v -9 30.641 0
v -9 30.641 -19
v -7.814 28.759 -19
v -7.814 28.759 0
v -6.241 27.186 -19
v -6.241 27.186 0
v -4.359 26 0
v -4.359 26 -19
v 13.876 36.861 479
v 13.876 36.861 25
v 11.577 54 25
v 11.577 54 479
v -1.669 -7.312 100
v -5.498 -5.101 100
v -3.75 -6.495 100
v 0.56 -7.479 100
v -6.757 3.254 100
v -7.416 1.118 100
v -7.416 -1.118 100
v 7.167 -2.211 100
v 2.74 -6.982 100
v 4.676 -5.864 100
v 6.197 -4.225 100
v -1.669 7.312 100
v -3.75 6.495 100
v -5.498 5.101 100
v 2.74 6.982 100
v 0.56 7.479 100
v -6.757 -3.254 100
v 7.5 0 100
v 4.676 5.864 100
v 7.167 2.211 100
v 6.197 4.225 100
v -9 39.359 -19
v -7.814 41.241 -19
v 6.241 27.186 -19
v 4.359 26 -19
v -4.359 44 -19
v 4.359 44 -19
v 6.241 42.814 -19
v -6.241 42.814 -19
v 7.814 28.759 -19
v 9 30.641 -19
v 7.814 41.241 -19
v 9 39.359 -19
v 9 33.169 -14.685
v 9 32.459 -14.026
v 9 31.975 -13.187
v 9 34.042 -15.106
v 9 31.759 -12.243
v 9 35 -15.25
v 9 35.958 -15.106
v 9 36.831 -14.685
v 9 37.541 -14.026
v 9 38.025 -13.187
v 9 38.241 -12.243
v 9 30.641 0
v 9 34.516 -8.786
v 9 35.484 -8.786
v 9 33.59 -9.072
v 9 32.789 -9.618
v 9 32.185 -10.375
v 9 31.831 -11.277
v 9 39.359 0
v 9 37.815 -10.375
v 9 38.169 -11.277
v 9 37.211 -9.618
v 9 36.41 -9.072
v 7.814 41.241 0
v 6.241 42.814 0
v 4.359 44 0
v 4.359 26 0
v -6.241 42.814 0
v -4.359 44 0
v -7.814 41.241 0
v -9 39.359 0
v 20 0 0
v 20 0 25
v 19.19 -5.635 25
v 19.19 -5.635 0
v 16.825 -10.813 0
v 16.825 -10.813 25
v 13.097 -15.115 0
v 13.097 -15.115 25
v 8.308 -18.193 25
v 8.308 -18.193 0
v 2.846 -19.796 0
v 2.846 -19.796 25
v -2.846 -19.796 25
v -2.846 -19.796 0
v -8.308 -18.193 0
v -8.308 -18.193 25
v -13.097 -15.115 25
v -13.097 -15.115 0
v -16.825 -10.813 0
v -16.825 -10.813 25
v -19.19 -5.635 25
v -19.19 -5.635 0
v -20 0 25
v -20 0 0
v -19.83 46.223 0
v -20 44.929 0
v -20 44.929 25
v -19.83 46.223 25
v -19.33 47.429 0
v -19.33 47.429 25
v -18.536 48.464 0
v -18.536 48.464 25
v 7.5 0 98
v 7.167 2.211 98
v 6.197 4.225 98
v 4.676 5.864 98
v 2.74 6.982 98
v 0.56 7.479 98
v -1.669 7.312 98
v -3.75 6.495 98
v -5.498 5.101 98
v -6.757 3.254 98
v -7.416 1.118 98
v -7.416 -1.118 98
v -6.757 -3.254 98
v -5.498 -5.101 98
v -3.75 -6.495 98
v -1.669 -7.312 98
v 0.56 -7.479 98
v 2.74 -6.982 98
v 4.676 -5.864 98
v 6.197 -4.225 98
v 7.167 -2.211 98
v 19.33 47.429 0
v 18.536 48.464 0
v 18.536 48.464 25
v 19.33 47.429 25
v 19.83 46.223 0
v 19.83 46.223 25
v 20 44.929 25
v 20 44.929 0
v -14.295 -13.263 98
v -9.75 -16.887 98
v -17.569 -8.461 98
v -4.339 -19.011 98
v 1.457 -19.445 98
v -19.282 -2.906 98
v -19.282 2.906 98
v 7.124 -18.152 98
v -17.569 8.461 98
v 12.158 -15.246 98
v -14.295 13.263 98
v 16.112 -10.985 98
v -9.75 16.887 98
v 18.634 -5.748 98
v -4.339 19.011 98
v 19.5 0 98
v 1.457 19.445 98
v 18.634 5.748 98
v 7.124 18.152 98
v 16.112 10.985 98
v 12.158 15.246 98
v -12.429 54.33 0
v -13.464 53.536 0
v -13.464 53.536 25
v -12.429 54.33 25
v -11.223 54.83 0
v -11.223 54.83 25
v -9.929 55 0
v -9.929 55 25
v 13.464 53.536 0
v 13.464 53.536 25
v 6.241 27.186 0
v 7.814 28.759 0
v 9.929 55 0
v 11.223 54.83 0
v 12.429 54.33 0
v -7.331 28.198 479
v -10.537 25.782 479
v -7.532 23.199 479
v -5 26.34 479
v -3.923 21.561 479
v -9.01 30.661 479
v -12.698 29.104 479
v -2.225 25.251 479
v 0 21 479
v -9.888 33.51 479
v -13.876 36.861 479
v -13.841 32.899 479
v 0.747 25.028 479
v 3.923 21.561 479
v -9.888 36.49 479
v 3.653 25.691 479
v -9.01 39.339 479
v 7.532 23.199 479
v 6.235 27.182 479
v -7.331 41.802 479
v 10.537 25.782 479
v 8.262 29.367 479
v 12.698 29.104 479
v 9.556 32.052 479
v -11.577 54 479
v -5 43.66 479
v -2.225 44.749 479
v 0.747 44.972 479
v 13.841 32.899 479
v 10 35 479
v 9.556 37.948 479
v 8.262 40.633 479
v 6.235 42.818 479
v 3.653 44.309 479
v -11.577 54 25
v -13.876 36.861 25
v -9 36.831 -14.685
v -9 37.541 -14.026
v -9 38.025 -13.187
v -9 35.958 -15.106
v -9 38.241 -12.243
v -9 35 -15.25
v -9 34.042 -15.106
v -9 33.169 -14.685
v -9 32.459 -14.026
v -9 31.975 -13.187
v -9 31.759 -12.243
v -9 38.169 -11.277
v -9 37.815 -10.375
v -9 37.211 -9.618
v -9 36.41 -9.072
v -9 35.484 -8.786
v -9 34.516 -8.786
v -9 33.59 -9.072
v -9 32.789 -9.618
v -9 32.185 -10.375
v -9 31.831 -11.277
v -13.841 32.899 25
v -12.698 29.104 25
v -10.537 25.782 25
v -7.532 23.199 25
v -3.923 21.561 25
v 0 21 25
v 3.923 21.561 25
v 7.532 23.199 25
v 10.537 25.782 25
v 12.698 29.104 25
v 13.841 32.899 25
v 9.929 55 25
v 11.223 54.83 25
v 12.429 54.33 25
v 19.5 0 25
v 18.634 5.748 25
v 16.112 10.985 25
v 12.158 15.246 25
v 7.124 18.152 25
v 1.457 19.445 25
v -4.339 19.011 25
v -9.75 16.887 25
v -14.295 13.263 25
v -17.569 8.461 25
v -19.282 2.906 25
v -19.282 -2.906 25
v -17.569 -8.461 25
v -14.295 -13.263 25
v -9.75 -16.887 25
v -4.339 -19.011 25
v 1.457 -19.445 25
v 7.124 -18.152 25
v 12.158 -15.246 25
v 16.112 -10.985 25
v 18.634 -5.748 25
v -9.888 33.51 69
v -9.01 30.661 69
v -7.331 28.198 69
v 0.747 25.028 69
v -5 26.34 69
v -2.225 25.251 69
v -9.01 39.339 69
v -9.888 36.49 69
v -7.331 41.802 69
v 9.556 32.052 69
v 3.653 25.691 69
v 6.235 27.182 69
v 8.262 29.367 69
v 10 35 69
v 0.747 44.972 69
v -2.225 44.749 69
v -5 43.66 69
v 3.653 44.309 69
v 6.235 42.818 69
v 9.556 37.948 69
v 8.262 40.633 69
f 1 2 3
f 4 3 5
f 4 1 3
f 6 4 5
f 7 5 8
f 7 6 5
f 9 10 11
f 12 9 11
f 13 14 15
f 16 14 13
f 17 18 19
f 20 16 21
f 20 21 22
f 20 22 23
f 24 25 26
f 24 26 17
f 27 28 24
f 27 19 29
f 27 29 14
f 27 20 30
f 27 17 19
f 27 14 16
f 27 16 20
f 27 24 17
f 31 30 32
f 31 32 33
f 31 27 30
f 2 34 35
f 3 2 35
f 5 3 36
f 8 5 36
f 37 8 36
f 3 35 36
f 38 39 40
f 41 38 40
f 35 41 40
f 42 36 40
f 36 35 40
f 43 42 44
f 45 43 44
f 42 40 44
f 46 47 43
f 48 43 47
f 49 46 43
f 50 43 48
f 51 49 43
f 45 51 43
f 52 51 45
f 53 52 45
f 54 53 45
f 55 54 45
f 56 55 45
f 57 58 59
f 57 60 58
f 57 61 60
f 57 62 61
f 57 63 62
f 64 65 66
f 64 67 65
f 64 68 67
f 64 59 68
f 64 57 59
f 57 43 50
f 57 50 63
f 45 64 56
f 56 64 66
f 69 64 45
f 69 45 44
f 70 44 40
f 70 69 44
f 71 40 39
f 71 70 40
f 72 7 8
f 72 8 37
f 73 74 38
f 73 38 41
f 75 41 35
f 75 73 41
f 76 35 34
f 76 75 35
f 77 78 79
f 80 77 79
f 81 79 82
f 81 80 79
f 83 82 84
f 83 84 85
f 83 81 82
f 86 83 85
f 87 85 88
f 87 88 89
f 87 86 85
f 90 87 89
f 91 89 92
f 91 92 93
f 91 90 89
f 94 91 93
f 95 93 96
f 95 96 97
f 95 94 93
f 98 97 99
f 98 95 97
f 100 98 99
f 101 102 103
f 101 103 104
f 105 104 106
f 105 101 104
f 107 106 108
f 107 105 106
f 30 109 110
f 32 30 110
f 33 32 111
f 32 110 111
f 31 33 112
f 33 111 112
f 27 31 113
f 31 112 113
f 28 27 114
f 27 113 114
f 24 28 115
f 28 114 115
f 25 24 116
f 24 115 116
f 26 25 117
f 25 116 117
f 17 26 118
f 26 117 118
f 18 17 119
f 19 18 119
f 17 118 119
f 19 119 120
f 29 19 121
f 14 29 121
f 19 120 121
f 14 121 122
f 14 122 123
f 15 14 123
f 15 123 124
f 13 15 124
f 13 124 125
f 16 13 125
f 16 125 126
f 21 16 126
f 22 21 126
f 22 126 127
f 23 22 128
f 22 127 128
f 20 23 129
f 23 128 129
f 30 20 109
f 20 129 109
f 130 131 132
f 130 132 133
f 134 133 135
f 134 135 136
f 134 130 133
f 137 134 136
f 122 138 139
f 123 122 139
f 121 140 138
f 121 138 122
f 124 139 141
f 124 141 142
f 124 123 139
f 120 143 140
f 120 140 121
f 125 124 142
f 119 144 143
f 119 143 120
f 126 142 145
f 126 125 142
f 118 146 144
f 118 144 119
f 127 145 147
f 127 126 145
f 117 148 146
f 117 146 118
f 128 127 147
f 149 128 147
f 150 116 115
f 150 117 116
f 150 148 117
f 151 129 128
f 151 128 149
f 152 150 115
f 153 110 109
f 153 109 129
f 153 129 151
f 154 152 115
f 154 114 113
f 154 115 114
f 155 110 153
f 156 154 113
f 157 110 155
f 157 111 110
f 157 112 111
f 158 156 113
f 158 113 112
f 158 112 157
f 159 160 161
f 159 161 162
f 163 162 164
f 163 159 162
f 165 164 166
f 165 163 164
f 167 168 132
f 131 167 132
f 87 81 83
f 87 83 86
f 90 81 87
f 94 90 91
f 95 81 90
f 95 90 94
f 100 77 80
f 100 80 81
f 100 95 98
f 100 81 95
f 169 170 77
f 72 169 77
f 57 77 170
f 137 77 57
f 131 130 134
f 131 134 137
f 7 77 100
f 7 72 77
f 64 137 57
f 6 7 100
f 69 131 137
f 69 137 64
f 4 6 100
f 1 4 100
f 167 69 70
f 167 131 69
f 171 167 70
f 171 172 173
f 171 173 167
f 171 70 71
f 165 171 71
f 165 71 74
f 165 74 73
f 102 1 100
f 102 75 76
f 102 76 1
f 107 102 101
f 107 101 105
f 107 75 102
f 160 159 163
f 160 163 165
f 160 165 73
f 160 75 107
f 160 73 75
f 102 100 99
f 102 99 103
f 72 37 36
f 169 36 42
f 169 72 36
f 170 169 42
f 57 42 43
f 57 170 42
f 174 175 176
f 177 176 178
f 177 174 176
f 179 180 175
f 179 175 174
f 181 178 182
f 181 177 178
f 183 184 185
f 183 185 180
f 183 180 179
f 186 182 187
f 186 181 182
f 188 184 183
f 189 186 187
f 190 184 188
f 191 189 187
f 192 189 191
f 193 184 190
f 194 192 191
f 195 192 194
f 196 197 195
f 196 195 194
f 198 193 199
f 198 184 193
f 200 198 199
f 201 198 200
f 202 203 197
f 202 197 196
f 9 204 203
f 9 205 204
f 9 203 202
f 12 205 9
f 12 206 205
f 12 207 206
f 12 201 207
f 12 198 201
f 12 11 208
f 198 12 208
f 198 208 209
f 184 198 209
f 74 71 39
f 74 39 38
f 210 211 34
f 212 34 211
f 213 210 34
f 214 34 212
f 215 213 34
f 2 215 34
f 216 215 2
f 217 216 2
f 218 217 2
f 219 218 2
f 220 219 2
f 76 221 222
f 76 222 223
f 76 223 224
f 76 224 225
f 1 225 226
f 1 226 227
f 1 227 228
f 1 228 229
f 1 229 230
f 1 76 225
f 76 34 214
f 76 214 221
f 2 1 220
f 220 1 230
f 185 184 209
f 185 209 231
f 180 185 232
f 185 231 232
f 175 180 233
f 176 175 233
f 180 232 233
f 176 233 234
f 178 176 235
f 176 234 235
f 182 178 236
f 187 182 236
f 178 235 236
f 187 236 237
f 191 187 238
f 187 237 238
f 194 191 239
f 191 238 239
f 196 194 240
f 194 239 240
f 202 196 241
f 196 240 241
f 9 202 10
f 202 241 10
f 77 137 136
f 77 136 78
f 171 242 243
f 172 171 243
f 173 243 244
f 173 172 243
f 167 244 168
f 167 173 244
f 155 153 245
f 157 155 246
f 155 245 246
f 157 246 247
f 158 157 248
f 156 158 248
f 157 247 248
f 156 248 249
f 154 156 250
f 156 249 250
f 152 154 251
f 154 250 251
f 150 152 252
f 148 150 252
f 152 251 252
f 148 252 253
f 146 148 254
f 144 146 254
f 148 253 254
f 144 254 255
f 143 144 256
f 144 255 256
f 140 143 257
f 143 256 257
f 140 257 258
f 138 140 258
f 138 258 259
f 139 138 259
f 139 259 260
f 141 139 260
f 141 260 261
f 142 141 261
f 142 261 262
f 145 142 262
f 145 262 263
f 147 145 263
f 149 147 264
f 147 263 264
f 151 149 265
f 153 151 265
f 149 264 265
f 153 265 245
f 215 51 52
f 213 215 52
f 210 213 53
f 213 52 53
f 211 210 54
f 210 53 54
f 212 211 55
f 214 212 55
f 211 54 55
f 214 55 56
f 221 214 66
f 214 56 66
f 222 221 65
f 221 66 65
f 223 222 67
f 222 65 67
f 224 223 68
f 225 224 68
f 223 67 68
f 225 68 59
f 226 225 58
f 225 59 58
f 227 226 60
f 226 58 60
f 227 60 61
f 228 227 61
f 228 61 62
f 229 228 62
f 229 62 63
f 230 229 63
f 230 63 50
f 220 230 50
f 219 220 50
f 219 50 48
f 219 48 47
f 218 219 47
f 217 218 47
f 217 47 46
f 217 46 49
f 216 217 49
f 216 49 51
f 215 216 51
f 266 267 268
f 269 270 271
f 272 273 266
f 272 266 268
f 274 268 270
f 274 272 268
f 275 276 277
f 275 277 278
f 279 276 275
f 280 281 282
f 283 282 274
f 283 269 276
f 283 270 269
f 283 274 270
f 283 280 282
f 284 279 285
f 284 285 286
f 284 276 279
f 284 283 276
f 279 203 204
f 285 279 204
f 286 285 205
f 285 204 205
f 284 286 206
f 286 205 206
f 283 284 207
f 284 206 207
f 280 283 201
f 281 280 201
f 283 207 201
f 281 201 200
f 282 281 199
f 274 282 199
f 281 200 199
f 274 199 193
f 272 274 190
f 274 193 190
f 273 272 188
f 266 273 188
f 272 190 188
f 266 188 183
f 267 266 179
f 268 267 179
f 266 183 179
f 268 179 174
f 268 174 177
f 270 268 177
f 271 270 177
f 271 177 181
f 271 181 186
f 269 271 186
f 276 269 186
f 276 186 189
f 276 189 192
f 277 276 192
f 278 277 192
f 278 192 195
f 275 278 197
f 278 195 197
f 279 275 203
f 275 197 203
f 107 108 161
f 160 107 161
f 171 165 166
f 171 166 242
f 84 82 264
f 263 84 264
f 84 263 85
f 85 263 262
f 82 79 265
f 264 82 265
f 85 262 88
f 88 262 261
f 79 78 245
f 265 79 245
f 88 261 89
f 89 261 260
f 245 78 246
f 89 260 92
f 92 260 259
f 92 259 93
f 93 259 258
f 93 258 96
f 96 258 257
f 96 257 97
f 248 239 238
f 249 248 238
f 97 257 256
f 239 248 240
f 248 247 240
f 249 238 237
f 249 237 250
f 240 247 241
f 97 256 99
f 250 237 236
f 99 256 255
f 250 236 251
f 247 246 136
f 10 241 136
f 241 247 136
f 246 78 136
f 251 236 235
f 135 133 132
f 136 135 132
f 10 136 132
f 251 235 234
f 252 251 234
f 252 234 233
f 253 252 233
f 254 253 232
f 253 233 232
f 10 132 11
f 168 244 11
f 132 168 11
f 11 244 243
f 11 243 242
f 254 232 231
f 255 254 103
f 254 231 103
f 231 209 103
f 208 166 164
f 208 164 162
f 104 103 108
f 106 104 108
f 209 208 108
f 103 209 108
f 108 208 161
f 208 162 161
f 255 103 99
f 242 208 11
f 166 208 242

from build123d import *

# Parameters (mm, degrees)
EXTRUDE_1_DEPTH     = 25
SKETCH_2_R          = 19.5
EXTRUDE_2_DEPTH     = 73
SKETCH_3_R          = 7.5
EXTRUDE_3_DEPTH     = 2
EXTRUDE_4_DEPTH     = 454
SKETCH_5_R          = 10
CUT_EXTRUDE_1_DEPTH = 410
EXTRUDE_5_DEPTH     = 19
SKETCH_7_R          = 3.25
CUT_EXTRUDE_2_DEPTH = 19


with BuildPart() as part:
    # 草图1 → 凸台-拉伸1 (new body)
    with BuildSketch(Plane.XY):
        with BuildLine():
            Line((-20, 0), (-20, 44.928932188))
            ThreePointArc((-20, 44.928932188), (-19.619397663, 46.84234935), (-18.535533906, 48.464466094))
            Line((-18.535533906, 48.464466094), (-13.464466094, 53.535533906))
            ThreePointArc((-13.464466094, 53.535533906), (-11.84234935, 54.619397663), (-9.928932188, 55))
            Line((-9.928932188, 55), (9.928932188, 55))
            ThreePointArc((9.928932188, 55), (11.84234935, 54.619397663), (13.464466094, 53.535533906))
            Line((13.464466094, 53.535533906), (18.535533906, 48.464466094))
            ThreePointArc((18.535533906, 48.464466094), (19.619397663, 46.84234935), (20, 44.928932188))
            Line((20, 44.928932188), (20, 0))
            ThreePointArc((20, 0), (0, -20), (-20, 0))
        make_face()
    extrude(amount=EXTRUDE_1_DEPTH)

    # 草图2 → 凸台-拉伸2 (add)
    with BuildSketch(Plane.XY.offset(25)):
        Circle(SKETCH_2_R)
    extrude(amount=EXTRUDE_2_DEPTH)

    # 草图3 → 凸台-拉伸3 (add)
    with BuildSketch(Plane.XY.offset(98)):
        Circle(SKETCH_3_R)
    extrude(amount=EXTRUDE_3_DEPTH)

    # 草图4 → 凸台-拉伸4 (add)
    with BuildSketch(Plane.XY.offset(25)):
        with BuildLine():
            Line((-11.576521962, 54), (-13.87569737, 36.861457087))
            ThreePointArc((-13.87569737, 36.861457087), (0, 21), (13.87569737, 36.861457087))
            Line((13.87569737, 36.861457087), (11.576521962, 54))
            Line((11.576521962, 54), (-11.576521962, 54))
        make_face()
    extrude(amount=EXTRUDE_4_DEPTH)

    # 草图5 → 切除-拉伸1 (cut)
    with BuildSketch(Plane.XY.offset(479)):
        with Locations((0, 35)):
            Circle(SKETCH_5_R)
    extrude(amount=-CUT_EXTRUDE_1_DEPTH, mode=Mode.SUBTRACT)

    # 草图6 → 凸台-拉伸5 (add)
    with BuildSketch(Plane(origin=(0, 0, 0), x_dir=(-1, 0, 0), z_dir=(0, 0, -1))):
        with BuildLine():
            Line((-4.358898944, 44), (4.358898944, 44))
            ThreePointArc((4.358898944, 44), (7.071067812, 42.071067812), (9, 39.358898944))
            Line((9, 39.358898944), (9, 30.641101056))
            ThreePointArc((9, 30.641101056), (7.071067812, 27.928932188), (4.358898944, 26))
            Line((4.358898944, 26), (-4.358898944, 26))
            ThreePointArc((-4.358898944, 26), (-7.071067812, 27.928932188), (-9, 30.641101056))
            Line((-9, 30.641101056), (-9, 39.358898944))
            ThreePointArc((-9, 39.358898944), (-7.071067812, 42.071067812), (-4.358898944, 44))
        make_face()
    extrude(amount=EXTRUDE_5_DEPTH)

    # 草图7 → 切除-拉伸2 (cut)
    with BuildSketch(Plane(origin=(9, 0, 0), x_dir=(0, 0, -1), z_dir=(1, 0, 0))):
        with Locations((12, 35)):
            Circle(SKETCH_7_R)
    extrude(amount=-CUT_EXTRUDE_2_DEPTH, mode=Mode.SUBTRACT)


solid = part.part
